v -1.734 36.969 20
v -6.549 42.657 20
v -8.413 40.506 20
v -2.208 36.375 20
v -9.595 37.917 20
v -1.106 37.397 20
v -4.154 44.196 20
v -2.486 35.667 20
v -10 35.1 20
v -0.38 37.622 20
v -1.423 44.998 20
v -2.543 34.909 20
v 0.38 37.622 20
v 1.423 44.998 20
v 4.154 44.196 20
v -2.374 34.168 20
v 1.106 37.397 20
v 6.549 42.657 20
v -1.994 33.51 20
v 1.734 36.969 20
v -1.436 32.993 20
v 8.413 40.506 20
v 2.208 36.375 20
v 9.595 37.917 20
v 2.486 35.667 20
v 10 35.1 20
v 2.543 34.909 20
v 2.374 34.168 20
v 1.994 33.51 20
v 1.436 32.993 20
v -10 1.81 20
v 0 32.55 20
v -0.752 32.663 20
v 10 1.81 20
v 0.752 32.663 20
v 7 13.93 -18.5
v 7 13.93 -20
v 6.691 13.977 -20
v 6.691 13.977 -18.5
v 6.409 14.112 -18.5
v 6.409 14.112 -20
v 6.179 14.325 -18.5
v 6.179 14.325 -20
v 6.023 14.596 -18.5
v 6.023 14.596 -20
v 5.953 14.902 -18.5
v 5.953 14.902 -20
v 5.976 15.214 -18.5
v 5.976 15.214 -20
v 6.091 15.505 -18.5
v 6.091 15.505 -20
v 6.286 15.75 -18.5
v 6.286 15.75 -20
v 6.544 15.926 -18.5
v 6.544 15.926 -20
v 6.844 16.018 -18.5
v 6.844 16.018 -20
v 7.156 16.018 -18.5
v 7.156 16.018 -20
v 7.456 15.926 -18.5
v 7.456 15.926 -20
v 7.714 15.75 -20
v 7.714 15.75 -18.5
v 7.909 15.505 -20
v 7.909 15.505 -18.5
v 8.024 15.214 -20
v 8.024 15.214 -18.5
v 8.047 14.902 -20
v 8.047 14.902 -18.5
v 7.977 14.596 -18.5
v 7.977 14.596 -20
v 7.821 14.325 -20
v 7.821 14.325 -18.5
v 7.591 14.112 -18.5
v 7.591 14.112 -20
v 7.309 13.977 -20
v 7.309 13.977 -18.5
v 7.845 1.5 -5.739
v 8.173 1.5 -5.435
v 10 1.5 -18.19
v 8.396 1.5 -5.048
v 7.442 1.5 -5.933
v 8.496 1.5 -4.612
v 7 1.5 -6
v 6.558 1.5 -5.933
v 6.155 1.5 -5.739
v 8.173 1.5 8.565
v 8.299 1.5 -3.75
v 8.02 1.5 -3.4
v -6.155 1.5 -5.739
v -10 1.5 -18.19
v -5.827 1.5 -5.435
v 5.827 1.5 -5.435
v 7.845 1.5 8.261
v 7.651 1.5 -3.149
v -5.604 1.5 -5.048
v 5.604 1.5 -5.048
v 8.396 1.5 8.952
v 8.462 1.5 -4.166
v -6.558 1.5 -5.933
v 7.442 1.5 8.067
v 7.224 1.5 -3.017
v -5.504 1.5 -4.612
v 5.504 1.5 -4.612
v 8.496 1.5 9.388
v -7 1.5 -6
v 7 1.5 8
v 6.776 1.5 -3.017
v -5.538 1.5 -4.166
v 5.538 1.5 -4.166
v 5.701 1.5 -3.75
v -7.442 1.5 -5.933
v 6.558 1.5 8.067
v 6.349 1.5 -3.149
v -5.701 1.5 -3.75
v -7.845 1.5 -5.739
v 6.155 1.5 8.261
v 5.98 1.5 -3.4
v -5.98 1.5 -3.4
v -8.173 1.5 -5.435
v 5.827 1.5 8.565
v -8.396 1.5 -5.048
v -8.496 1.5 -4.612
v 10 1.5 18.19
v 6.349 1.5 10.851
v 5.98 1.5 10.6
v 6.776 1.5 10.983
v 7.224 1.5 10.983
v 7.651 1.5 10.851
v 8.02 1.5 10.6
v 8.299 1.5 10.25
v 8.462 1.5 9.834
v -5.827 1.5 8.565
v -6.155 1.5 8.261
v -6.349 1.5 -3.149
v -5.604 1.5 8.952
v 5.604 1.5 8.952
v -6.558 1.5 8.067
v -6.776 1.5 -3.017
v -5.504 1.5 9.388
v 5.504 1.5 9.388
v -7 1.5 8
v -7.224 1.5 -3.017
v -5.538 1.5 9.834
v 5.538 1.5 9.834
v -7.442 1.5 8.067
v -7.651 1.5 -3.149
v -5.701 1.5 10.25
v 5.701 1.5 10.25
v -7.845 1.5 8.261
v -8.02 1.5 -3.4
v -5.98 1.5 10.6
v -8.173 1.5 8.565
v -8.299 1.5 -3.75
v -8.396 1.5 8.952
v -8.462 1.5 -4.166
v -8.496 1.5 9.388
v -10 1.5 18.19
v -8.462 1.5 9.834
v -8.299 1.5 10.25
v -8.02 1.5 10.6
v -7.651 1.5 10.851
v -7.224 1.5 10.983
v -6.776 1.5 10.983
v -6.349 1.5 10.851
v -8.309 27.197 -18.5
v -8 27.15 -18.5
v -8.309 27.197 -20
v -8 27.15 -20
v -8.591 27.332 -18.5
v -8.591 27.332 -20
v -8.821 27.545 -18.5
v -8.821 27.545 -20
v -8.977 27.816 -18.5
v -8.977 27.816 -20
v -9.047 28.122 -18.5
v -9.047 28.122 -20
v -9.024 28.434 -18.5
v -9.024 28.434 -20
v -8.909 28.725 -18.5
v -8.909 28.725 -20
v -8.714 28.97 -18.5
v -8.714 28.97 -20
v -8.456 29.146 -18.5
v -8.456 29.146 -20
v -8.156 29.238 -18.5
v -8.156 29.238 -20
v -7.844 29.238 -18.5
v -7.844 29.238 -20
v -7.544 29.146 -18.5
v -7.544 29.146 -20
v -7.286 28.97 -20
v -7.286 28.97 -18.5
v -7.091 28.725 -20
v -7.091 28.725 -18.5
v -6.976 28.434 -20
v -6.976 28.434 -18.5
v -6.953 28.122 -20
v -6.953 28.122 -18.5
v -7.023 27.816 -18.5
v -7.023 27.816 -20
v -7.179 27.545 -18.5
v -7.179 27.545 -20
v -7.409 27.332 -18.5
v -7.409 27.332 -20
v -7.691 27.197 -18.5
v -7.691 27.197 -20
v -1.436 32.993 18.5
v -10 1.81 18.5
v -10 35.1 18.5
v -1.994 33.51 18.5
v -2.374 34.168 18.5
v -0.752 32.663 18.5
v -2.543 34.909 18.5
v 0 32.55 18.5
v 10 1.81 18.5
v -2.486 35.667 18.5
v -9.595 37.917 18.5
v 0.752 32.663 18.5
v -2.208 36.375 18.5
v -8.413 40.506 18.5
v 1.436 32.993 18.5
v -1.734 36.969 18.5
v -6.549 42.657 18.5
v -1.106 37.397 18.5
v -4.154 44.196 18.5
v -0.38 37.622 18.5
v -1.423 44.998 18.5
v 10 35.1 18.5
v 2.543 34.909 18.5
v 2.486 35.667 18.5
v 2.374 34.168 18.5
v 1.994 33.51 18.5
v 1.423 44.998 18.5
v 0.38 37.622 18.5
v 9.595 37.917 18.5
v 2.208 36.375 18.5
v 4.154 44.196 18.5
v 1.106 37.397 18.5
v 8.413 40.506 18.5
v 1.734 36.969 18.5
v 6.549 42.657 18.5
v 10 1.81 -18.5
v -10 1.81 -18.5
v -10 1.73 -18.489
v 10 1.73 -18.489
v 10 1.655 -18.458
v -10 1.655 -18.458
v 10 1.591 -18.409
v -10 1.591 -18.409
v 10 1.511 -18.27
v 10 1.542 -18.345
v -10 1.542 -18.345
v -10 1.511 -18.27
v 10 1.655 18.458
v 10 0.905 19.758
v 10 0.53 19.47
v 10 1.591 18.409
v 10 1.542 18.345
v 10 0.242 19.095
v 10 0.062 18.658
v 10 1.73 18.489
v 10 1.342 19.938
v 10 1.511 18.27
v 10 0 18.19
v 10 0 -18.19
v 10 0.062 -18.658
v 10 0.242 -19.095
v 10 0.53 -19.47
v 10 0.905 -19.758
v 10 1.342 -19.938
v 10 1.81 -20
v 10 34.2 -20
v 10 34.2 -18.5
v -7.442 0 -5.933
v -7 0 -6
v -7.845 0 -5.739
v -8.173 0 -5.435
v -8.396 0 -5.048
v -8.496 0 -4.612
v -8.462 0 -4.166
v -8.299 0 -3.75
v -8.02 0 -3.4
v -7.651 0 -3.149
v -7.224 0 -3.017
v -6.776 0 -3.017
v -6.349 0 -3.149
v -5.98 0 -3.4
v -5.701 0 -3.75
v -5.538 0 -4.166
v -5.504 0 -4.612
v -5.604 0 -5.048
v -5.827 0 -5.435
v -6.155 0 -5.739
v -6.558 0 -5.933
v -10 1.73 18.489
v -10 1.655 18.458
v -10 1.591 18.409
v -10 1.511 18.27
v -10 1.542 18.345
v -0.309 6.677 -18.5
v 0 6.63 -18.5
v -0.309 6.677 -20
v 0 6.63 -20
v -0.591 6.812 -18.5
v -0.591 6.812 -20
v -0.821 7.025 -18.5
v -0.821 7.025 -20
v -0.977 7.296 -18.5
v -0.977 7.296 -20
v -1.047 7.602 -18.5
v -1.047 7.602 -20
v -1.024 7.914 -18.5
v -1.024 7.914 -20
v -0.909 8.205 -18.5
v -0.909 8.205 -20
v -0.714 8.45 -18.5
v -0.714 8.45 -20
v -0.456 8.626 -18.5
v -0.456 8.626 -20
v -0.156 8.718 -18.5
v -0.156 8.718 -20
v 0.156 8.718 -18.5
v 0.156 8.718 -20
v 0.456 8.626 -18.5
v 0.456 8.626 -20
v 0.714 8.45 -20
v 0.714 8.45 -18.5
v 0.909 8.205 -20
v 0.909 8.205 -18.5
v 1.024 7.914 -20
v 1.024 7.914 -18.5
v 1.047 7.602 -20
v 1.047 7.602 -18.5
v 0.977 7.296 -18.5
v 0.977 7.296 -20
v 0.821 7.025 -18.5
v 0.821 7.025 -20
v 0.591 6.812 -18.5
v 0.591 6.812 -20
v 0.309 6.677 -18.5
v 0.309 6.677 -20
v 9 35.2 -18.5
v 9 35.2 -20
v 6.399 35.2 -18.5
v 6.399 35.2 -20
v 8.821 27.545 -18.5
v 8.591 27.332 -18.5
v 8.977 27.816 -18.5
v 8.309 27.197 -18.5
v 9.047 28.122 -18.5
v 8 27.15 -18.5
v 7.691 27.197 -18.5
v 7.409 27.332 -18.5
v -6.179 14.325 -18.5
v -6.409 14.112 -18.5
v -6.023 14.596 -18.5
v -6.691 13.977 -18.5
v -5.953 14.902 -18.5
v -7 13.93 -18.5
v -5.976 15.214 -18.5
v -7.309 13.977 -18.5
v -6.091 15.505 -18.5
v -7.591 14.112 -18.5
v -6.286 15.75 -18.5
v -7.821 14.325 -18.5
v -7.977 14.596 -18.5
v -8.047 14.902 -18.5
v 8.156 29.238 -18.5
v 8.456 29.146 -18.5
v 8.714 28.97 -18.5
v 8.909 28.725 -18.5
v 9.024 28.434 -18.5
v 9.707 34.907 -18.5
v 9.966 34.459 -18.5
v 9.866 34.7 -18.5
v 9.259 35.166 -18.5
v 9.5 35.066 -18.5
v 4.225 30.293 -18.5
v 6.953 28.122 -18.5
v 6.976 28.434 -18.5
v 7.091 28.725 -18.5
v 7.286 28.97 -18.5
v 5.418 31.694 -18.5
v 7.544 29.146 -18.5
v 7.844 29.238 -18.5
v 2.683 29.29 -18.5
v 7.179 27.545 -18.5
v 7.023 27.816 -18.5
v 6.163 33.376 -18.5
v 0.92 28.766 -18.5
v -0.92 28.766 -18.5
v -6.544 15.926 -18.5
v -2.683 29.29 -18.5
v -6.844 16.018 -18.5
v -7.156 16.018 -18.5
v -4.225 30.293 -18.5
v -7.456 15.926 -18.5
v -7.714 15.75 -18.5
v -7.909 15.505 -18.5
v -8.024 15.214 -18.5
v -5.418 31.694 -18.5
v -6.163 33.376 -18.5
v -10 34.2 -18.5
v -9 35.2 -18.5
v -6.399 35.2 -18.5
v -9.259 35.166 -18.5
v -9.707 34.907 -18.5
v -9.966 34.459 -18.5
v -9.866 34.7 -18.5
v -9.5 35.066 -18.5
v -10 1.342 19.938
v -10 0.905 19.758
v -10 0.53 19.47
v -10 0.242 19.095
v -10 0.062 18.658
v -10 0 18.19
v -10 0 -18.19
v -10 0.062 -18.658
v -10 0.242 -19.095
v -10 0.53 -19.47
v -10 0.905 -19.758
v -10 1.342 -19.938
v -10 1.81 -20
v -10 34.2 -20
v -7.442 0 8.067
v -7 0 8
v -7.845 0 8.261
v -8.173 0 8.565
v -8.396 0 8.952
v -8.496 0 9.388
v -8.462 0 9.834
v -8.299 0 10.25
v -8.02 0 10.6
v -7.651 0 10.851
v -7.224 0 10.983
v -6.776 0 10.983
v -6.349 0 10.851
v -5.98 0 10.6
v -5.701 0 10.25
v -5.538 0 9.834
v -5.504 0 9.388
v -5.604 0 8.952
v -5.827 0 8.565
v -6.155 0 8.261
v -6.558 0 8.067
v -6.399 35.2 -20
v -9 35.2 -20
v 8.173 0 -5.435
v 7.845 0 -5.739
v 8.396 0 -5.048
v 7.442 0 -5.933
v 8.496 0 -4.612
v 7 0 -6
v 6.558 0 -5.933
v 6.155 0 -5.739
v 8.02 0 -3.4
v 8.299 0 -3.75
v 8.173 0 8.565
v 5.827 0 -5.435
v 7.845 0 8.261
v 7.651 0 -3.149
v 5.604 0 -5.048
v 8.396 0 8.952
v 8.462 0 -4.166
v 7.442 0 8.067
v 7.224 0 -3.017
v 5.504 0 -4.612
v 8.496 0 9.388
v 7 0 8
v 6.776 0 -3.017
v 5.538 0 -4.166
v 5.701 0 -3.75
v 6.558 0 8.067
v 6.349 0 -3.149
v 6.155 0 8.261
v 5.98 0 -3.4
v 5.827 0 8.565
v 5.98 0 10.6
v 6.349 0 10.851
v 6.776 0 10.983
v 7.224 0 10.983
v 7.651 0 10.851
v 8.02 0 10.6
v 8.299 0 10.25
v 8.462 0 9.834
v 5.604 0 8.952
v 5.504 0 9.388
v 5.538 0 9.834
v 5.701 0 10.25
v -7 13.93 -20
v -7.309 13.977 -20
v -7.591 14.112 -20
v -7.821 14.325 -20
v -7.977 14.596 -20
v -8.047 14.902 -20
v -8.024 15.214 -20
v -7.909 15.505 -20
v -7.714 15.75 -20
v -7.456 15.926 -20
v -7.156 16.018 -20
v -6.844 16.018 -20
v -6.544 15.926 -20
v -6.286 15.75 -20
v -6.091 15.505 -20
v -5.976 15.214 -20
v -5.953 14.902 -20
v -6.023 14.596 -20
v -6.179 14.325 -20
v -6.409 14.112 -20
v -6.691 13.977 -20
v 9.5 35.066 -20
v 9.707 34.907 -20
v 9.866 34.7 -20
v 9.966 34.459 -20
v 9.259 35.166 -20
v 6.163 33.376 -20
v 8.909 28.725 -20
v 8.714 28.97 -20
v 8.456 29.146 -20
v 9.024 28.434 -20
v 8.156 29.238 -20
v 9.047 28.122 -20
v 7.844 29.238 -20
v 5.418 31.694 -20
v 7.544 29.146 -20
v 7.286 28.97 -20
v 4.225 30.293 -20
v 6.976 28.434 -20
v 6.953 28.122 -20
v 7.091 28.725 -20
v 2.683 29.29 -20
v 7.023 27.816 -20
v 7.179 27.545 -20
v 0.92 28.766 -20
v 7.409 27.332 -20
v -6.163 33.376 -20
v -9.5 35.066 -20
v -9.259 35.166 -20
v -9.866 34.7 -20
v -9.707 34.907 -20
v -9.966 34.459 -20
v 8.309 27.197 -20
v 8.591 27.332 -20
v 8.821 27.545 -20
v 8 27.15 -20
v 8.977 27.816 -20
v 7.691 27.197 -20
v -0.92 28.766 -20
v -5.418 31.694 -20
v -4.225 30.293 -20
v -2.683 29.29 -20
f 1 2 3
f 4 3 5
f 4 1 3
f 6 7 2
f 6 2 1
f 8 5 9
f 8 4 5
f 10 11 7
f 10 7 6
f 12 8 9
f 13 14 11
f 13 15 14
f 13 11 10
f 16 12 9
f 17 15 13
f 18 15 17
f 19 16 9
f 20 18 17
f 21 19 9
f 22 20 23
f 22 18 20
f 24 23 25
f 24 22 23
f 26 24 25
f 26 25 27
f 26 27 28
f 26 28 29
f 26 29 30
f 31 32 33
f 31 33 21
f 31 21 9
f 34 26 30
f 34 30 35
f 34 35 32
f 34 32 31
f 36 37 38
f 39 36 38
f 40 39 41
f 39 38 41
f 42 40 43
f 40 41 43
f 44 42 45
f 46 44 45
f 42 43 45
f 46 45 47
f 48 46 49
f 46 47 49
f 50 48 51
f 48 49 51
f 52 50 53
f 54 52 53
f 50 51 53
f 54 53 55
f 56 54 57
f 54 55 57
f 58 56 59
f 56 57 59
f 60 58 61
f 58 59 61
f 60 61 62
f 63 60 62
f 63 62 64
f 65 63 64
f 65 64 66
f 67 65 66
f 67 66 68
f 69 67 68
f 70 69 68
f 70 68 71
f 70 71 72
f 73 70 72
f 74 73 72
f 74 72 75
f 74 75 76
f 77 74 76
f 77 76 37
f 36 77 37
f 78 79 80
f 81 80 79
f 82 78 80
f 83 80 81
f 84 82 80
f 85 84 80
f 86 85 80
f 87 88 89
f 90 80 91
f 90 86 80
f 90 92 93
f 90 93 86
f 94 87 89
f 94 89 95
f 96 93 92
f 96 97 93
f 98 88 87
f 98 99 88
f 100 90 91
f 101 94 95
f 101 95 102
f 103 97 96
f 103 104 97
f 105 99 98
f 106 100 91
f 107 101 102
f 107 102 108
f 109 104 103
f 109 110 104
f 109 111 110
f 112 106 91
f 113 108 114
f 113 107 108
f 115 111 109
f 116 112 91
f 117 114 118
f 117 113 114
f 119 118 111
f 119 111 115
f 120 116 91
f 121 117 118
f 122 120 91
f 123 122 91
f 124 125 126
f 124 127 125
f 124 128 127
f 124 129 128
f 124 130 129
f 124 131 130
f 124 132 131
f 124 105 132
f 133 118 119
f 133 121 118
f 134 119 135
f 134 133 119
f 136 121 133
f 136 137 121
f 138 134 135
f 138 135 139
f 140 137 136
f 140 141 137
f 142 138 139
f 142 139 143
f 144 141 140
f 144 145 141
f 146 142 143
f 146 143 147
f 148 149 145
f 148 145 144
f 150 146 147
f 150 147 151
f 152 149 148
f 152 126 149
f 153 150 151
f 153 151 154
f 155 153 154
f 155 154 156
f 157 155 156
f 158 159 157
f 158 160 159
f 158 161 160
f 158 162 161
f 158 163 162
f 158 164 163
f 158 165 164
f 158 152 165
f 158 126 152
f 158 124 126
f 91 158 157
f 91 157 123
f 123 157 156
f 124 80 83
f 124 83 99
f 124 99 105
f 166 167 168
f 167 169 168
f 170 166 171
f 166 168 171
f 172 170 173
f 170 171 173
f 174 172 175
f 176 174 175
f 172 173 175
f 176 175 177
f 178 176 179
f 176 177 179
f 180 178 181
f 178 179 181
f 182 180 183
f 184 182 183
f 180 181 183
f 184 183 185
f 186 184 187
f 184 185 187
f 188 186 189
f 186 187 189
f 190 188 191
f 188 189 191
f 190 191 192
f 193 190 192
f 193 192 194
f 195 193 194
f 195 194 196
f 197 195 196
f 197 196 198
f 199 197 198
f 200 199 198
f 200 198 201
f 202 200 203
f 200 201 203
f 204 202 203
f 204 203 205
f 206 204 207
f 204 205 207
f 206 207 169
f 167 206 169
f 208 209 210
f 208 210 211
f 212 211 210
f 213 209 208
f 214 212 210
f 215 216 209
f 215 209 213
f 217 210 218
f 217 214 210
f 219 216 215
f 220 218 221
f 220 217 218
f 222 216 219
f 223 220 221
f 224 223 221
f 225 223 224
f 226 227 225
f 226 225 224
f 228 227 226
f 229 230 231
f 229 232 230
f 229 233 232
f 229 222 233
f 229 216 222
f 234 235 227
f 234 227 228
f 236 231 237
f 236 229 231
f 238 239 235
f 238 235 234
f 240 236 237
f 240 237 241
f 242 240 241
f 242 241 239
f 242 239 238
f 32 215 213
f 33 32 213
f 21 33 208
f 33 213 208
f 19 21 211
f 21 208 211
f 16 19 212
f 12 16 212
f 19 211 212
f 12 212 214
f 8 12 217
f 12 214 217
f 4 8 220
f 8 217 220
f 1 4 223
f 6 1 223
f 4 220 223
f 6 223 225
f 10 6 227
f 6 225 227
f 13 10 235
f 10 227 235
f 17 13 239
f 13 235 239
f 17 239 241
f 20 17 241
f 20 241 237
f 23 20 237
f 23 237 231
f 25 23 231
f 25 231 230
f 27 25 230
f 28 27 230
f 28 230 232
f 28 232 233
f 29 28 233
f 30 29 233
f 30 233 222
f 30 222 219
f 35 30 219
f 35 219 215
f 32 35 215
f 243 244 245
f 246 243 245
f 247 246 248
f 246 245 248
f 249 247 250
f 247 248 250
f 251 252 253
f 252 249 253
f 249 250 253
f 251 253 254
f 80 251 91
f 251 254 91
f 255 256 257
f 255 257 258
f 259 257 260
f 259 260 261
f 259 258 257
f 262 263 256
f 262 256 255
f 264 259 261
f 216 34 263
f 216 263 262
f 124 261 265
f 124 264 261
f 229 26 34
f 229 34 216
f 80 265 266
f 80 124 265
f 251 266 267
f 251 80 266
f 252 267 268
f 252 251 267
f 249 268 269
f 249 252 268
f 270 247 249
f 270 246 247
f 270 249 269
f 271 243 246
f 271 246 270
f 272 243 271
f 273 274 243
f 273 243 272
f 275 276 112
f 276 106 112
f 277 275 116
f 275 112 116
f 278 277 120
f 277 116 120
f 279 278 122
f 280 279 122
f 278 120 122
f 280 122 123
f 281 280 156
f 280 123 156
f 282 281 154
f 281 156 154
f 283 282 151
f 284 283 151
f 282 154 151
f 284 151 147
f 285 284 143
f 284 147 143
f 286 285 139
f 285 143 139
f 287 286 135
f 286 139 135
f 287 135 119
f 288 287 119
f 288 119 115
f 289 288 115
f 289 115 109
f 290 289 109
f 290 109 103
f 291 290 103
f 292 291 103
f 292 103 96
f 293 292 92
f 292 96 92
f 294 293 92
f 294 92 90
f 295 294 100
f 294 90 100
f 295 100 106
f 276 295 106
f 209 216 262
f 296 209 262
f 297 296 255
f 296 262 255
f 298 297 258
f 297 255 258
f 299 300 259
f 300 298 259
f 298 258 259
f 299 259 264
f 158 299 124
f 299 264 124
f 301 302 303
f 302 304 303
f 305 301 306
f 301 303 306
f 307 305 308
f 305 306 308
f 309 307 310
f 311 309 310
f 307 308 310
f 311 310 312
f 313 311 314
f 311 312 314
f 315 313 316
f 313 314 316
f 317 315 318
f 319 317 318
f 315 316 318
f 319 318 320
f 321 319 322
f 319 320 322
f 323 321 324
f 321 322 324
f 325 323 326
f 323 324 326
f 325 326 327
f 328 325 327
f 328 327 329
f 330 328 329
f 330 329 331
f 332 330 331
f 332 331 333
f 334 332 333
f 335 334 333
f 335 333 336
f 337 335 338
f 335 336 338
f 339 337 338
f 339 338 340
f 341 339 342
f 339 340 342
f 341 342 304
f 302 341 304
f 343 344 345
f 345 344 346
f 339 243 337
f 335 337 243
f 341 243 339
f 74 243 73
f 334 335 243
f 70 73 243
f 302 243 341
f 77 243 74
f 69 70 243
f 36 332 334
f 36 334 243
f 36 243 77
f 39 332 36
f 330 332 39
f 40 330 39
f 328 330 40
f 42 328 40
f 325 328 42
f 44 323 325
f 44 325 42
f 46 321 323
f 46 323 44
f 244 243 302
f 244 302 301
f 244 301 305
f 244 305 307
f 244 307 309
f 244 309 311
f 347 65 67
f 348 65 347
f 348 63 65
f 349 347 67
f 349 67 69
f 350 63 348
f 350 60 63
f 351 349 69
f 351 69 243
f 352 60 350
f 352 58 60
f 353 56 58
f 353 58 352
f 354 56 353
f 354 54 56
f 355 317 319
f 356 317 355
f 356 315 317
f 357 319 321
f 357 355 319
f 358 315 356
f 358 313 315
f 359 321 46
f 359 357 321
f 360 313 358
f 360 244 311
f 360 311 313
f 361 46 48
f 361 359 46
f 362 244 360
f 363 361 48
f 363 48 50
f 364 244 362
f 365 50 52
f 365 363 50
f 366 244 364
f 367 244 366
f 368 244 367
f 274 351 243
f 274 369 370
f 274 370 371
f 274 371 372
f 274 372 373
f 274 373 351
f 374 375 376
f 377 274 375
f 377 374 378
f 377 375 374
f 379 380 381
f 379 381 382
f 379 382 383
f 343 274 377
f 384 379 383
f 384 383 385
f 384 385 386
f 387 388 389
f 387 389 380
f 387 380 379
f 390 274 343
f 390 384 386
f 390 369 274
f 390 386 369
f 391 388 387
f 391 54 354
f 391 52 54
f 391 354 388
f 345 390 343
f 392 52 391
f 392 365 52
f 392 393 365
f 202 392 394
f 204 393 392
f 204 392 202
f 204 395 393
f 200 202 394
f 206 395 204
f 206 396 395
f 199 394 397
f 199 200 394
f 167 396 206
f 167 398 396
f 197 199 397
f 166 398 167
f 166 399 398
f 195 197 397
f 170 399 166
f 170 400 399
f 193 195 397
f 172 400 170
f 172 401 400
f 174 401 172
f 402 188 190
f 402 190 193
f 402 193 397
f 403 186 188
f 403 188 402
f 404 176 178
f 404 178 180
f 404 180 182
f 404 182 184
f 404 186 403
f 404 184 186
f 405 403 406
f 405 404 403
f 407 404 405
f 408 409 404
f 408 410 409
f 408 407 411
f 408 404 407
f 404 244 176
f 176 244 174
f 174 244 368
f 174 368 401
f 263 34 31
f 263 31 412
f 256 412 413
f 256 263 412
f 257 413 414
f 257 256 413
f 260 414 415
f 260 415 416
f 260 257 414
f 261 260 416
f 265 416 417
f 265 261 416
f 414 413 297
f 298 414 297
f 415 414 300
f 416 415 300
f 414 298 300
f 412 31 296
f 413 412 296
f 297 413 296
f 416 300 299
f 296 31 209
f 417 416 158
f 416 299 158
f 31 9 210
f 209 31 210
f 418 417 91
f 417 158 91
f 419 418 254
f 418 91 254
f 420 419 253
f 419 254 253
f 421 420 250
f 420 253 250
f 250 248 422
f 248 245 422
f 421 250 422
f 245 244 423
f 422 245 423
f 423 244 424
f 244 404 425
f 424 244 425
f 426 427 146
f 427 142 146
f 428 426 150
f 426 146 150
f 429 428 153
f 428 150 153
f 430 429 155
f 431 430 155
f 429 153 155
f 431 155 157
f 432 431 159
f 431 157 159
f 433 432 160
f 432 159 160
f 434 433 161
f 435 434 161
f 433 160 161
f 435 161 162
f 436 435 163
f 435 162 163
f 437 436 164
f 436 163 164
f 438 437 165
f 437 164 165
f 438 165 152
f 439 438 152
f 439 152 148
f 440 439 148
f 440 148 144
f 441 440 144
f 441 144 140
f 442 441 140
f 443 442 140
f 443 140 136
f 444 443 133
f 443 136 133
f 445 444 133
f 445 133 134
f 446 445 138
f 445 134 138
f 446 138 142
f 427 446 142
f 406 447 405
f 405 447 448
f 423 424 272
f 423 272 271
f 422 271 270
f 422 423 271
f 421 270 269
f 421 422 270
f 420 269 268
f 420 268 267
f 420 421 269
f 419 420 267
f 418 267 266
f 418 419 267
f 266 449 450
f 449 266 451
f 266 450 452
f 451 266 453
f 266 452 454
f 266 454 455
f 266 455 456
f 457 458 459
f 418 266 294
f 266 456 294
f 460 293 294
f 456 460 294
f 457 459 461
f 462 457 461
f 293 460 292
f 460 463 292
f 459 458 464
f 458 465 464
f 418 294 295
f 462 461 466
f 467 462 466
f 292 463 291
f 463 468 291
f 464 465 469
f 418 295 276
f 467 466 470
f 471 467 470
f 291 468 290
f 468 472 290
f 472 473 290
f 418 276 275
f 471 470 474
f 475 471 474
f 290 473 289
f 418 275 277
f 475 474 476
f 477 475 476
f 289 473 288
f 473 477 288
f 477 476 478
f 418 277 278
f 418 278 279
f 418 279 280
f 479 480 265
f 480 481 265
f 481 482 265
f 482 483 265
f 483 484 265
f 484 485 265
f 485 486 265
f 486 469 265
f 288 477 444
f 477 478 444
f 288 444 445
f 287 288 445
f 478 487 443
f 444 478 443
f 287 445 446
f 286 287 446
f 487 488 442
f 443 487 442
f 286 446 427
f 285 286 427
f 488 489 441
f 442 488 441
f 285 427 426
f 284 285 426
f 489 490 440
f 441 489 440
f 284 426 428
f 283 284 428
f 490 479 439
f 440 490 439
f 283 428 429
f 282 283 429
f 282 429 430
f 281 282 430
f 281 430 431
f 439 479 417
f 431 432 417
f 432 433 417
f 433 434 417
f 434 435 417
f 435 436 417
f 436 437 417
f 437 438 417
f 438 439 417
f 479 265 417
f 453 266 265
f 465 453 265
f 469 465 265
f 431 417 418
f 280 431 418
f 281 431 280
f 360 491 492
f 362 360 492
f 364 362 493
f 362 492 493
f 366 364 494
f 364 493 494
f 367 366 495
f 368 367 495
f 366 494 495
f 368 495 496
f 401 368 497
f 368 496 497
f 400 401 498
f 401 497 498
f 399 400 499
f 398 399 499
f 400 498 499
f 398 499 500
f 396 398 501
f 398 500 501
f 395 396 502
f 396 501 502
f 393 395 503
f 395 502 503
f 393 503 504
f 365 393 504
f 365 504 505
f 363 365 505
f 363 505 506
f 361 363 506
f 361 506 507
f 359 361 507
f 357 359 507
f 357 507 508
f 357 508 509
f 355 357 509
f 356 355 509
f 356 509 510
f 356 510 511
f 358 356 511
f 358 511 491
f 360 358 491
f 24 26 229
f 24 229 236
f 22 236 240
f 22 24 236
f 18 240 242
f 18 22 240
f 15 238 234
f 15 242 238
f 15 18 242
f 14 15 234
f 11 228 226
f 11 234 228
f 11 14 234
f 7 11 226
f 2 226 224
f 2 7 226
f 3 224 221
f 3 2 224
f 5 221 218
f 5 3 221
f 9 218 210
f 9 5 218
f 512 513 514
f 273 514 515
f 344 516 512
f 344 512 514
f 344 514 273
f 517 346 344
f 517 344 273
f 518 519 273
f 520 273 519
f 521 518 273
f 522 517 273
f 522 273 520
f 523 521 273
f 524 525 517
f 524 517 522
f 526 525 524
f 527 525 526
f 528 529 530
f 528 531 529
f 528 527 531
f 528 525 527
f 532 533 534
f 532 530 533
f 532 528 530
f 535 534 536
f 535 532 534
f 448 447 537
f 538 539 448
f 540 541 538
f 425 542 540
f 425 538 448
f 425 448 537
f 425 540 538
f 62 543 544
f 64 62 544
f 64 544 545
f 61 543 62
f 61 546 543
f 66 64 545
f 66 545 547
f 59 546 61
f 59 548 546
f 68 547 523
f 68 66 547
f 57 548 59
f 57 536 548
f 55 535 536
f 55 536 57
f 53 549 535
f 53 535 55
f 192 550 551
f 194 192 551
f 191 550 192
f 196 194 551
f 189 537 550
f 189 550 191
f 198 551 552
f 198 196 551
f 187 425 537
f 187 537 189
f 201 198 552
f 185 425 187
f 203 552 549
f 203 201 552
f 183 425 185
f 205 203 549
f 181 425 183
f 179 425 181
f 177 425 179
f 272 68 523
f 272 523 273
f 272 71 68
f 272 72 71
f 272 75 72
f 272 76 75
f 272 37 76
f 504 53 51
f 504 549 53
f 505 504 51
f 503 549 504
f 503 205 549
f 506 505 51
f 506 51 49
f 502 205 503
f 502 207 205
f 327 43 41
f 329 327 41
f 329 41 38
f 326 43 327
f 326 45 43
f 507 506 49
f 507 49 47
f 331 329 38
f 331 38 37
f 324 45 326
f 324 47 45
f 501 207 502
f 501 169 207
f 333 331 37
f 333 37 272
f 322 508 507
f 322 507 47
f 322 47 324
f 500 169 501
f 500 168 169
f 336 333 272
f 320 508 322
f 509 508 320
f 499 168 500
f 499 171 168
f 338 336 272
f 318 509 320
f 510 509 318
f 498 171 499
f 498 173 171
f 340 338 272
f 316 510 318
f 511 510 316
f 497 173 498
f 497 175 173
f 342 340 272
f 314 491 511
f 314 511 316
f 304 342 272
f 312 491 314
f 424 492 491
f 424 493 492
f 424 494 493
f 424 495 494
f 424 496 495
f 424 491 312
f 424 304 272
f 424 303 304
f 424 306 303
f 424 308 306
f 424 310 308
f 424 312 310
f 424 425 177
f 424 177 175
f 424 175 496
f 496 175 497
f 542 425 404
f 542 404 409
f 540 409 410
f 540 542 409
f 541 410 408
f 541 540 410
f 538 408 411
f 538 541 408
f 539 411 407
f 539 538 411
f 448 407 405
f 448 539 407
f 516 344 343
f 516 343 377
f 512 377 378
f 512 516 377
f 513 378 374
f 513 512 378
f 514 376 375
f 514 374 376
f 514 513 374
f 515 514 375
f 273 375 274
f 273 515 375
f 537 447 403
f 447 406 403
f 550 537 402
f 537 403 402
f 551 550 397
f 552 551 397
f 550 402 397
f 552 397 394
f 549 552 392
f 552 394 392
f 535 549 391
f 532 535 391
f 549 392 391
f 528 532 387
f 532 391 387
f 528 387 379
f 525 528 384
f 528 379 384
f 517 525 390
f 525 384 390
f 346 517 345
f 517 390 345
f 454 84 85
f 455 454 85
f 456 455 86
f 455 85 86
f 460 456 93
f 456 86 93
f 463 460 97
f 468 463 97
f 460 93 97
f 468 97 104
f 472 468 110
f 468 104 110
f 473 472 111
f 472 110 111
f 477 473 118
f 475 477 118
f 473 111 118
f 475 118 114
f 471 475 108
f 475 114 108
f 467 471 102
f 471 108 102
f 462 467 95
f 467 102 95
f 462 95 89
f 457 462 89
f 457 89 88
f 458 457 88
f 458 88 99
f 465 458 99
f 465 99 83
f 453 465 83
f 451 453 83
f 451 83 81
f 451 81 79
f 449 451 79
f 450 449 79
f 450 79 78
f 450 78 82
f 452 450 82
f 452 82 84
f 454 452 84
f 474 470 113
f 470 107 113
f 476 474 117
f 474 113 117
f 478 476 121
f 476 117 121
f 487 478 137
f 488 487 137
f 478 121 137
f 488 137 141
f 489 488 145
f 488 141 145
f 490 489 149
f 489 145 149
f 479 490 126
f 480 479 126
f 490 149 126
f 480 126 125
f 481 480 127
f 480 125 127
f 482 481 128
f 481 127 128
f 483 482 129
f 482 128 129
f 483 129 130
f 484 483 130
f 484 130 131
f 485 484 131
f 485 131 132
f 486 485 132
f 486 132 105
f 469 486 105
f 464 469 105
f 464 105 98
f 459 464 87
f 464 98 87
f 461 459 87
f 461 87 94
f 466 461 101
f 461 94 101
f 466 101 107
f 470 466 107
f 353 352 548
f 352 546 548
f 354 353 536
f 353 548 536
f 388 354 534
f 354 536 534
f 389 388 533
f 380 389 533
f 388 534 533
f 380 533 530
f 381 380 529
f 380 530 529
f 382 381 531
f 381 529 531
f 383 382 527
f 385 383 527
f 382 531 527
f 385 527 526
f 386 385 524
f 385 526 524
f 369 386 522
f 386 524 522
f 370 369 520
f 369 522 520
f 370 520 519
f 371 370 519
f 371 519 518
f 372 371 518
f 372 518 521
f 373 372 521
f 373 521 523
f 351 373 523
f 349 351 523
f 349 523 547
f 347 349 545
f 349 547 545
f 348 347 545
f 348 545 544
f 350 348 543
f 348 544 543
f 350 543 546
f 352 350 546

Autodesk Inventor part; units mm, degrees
ref_plane "YZ Plane" through (0, 0, 0) normal (1, 0, 0) x (0, 1, 0)
ref_plane "XZ Plane" through (0, 0, 0) normal (0, 1, 0) x (-1, 0, 0)
ref_plane "XY Plane" through (0, 0, 0) normal (0, 0, 1) x (1, 0, 0)
sketch "Sketch1" plane through (0, 0, 0) normal (0, 1, 0) x (-1, 0, 0)
  line L0 (10, -18.5) -> (-10, -18.5)
  line L1 (-10, -18.5) -> (-10, 18.5)
  line L2 (-10, 18.5) -> (10, 18.5)
  line L3 (10, 18.5) -> (10, -18.5)
  point P0 (0, 0)
  dimension "d0" = 20
  dimension "d1" = 37
  dimension "d2" = 18.5
  dimension "d3" = 10
extrude "Plate1" add sketch "Sketch1" along normal blind 1.5
sketch "Sketch2" plane through (-10, 0, -20) normal (0, 0, 1) x (1, 0, 0)
  line L0 (20, 0) -> (0, 0)
  line L1 (0, 0) -> (0, 45.1)
  line L2 (0, 45.1) -> (20, 45.1)
  line L3 (20, 45.1) -> (20, 0)
edge flange "Flange1" height 45.1 angle 90 thickness 1.5 bend radius 0.31 thickness toward (0, 0, 1) relief tear relief width 1.5 relief depth 0.75 edges at (0, 1.5, -18.5) wall of the first edge with corners at (10, 0, -20) (-10, 0, -20) (-10, 45.1, -20) (10, 45.1, -20)
bend "Bend1"
corner "Corner1"
sketch "Sketch3" plane through (10, 0, 20) normal (0, 0, -1) x (-1, 0, 0)
  line L0 (20, 0) -> (0, 0)
  line L1 (0, 0) -> (0, 45.1)
  line L2 (0, 45.1) -> (20, 45.1)
  line L3 (20, 45.1) -> (20, 0)
edge flange "Flange2" height 45.1 angle 90 thickness 1.5 bend radius 0.31 thickness toward (0, 0, -1) relief tear relief width 1.5 relief depth 0.75 edges at (0, 1.5, 18.5) wall of the first edge with corners at (-10, 0, 20) (10, 0, 20) (10, 45.1, 20) (-10, 45.1, 20)
bend "Bend2"
corner "Corner2"
sketch "Sketch4" plane through (-10, 45.1, 20) normal (0, 0, 1) x (1, 0, 0)
  circle A0 centre (10, -10) radius 10
  line L0 (0, 0) -> (20, 0) projected
  line L1 (0, 0) -> (20, 0)
  line L2 (20, 0) -> (20, -10)
  line L3 (20, -10) -> (0, -10)
  line L4 (0, -10) -> (0, 0)
  line L5 (0, -43.29) -> (0, 0) projected
  point P0 (10, -45.1)
  point P1 (10, -10)
  point P2 (20, 0)
  point P3 (10, 0)
  point P4 (0, -10)
  point P5 (8.5893, 0)
  point P6 (0, -10)
  dimension "d26" = 20
  dimension "d25" = 10
  dimension "d27" = 10
  dimension "d28" = 10
extrude "Extrusion1" cut sketch "Sketch4" against normal blind 10 contours L4 L0 A0 | A0 L0 L2
sketch "Sketch5" plane through (10, 45.1, -20) normal (0, 0, -1) x (-1, 0, 0)
  arc A0 (20, -10) -> (0, -10) centre (10, -10) ccw projected
  point P0 (10, -45.1)
hole "Hole1" at (0, 35.1, -20) direction (0, 0, 1) diameter 12.8 depth 1.5
sketch "Sketch6" plane through (10, 45.1, -20) normal (0, 0, -1) x (-1, 0, 0)
  circle A0 centre (10, -10) radius 6.4 projected
  line L0 (0, 0) -> (20, 0) projected
  line L1 (0, -43.29) -> (0, 0) projected
  line L2 (24, 0) -> (-4, 0)
  line L3 (-4, 0) -> (-4, -9.9)
  line L4 (-4, -9.9) -> (24, -9.9)
  line L5 (24, -9.9) -> (24, 0)
  point P0 (10, -45.1)
  point P1 (20, 0)
  point P2 (6.005, 0)
  point P3 (13.995, 0)
  dimension "d38" = 9.9
  dimension "d39" = 4
  dimension "d40" = 28
extrude "Extrusion2" cut sketch "Sketch6" against normal blind 10 contours L4 A0 | A0 L4 L1 L0 L2 L5 | L4 L3 L2 L1 picked at (9.1972, -6.4205)
fillet "Fillet1" radius 1 2 edges at (-10, 35.2, -19.25) (10, 35.2, -19.25)
sketch "Sketch7" plane through (-10, 1.81, 20) normal (0, 0, 1) x (1, 0, 0)
  arc A0 (20, 33.29) -> (0, 33.29) centre (10, 33.29) ccw projected
  point P0 (10, -1.81)
hole "Hole2" at (0, 35.1, 20) direction (0, 0, -1) diameter 5.1 depth 1.5 clearance for "Hex Head Bolt" size "M5" standard "Ansi Metric M Profile"
sketch "Sketch8" plane through (0, 0, 0) normal (0, -1, 0) x (1, 0, 0)
  line L0 (2.55, 18.5) -> (-2.55, 18.5) projected
  line L1 (-10, 18.5) -> (10, 18.5) projected
  line L2 (10, 18.5) -> (-10, 18.5) projected
  line L3 (10, 18.19) -> (-10, 18.19) projected
  line L4 (-10, -18.19) -> (-10, 18.19) projected
  line L5 (-10, -18.19) -> (10, -18.19) projected
  line L6 (10, 18.19) -> (10, -18.19) projected
  point P0 (0, 0)
  point P1 (7, 9.5)
  point P2 (7, -4.5)
  point P3 (-7, 9.5)
  point P4 (-7, -4.5)
  dimension "d51" = 9
  dimension "d52" = 3
  dimension "d55" = 14
  dimension "d58" = 14
hole "Hole3" at (7, 0, 9.5) at (7, 0, -4.5) at (-7, 0, 9.5) at (-7, 0, -4.5) direction (0, 1, 0) diameter 3 depth 1.5
sketch "Sketch11" plane through (-10, 1.81, -18.5) normal (0, 0, 1) x (1, 0, 0)
  circle A0 centre (18, 26.39) radius 0.7835
  circle A1 centre (2, 26.39) radius 0.7835
  circle A2 centre (17, 13.17) radius 0.7835
  circle A3 centre (3, 13.17) radius 0.7835
  circle A4 centre (10, 5.87) radius 0.7835
  point P0 (10, -1.81)
hole "Hole6" at (-8, 28.2, -18.5) at (-7, 14.98, -18.5) at (0, 7.68, -18.5) at (7, 14.98, -18.5) at (8, 28.2, -18.5) direction (0, 0, -1) diameter 2.1 depth 1.5
equation "\"d36\" = Thickness"
equation "\"d49\" = Thickness"
equation "\"d66\" = Thickness"
equation "\"d87\" = Thickness"
equation "\"d4\" = Thickness"
equation "\"d5\" = BendReliefWidth"
equation "\"d6\" = BendReliefDepth"
equation "\"d7\" = MinimumRemnant"
equation "\"d8\" = TransitionRadius"
equation "\"d11\" = BendRadius"
equation "\"d12\" = CornerReliefSize"
equation "\"d13\" = GapSize"
equation "\"d14\" = JacobiRadiusSize"
equation "\"d15\" = BendReliefWidth"
equation "\"d16\" = BendReliefDepth"
equation "\"d17\" = MinimumRemnant"
equation "\"d18\" = TransitionRadius"
equation "\"d21\" = BendRadius"
equation "\"d22\" = CornerReliefSize"
equation "\"d23\" = GapSize"
equation "\"d24\" = JacobiRadiusSize"
equation "\"BendReliefWidth\" = Thickness"
equation "\"BendReliefDepth\" = 0.5 * Thickness"
equation "\"CornerReliefSize\" = 4 * Thickness"
equation "\"MinimumRemnant\" = 2 * Thickness"
equation "\"TransitionRadius\" = BendRadius"
equation "\"JacobiRadiusSize\" = BendRadius"
equation "\"GapSize\" = Thickness"
equation "\"Thickness\" = 1.5"
equation "\"BendRadius\" = 0.31"
properties part number "axis_9_bottom_frame" material "Aluminum 6061-AHC"
